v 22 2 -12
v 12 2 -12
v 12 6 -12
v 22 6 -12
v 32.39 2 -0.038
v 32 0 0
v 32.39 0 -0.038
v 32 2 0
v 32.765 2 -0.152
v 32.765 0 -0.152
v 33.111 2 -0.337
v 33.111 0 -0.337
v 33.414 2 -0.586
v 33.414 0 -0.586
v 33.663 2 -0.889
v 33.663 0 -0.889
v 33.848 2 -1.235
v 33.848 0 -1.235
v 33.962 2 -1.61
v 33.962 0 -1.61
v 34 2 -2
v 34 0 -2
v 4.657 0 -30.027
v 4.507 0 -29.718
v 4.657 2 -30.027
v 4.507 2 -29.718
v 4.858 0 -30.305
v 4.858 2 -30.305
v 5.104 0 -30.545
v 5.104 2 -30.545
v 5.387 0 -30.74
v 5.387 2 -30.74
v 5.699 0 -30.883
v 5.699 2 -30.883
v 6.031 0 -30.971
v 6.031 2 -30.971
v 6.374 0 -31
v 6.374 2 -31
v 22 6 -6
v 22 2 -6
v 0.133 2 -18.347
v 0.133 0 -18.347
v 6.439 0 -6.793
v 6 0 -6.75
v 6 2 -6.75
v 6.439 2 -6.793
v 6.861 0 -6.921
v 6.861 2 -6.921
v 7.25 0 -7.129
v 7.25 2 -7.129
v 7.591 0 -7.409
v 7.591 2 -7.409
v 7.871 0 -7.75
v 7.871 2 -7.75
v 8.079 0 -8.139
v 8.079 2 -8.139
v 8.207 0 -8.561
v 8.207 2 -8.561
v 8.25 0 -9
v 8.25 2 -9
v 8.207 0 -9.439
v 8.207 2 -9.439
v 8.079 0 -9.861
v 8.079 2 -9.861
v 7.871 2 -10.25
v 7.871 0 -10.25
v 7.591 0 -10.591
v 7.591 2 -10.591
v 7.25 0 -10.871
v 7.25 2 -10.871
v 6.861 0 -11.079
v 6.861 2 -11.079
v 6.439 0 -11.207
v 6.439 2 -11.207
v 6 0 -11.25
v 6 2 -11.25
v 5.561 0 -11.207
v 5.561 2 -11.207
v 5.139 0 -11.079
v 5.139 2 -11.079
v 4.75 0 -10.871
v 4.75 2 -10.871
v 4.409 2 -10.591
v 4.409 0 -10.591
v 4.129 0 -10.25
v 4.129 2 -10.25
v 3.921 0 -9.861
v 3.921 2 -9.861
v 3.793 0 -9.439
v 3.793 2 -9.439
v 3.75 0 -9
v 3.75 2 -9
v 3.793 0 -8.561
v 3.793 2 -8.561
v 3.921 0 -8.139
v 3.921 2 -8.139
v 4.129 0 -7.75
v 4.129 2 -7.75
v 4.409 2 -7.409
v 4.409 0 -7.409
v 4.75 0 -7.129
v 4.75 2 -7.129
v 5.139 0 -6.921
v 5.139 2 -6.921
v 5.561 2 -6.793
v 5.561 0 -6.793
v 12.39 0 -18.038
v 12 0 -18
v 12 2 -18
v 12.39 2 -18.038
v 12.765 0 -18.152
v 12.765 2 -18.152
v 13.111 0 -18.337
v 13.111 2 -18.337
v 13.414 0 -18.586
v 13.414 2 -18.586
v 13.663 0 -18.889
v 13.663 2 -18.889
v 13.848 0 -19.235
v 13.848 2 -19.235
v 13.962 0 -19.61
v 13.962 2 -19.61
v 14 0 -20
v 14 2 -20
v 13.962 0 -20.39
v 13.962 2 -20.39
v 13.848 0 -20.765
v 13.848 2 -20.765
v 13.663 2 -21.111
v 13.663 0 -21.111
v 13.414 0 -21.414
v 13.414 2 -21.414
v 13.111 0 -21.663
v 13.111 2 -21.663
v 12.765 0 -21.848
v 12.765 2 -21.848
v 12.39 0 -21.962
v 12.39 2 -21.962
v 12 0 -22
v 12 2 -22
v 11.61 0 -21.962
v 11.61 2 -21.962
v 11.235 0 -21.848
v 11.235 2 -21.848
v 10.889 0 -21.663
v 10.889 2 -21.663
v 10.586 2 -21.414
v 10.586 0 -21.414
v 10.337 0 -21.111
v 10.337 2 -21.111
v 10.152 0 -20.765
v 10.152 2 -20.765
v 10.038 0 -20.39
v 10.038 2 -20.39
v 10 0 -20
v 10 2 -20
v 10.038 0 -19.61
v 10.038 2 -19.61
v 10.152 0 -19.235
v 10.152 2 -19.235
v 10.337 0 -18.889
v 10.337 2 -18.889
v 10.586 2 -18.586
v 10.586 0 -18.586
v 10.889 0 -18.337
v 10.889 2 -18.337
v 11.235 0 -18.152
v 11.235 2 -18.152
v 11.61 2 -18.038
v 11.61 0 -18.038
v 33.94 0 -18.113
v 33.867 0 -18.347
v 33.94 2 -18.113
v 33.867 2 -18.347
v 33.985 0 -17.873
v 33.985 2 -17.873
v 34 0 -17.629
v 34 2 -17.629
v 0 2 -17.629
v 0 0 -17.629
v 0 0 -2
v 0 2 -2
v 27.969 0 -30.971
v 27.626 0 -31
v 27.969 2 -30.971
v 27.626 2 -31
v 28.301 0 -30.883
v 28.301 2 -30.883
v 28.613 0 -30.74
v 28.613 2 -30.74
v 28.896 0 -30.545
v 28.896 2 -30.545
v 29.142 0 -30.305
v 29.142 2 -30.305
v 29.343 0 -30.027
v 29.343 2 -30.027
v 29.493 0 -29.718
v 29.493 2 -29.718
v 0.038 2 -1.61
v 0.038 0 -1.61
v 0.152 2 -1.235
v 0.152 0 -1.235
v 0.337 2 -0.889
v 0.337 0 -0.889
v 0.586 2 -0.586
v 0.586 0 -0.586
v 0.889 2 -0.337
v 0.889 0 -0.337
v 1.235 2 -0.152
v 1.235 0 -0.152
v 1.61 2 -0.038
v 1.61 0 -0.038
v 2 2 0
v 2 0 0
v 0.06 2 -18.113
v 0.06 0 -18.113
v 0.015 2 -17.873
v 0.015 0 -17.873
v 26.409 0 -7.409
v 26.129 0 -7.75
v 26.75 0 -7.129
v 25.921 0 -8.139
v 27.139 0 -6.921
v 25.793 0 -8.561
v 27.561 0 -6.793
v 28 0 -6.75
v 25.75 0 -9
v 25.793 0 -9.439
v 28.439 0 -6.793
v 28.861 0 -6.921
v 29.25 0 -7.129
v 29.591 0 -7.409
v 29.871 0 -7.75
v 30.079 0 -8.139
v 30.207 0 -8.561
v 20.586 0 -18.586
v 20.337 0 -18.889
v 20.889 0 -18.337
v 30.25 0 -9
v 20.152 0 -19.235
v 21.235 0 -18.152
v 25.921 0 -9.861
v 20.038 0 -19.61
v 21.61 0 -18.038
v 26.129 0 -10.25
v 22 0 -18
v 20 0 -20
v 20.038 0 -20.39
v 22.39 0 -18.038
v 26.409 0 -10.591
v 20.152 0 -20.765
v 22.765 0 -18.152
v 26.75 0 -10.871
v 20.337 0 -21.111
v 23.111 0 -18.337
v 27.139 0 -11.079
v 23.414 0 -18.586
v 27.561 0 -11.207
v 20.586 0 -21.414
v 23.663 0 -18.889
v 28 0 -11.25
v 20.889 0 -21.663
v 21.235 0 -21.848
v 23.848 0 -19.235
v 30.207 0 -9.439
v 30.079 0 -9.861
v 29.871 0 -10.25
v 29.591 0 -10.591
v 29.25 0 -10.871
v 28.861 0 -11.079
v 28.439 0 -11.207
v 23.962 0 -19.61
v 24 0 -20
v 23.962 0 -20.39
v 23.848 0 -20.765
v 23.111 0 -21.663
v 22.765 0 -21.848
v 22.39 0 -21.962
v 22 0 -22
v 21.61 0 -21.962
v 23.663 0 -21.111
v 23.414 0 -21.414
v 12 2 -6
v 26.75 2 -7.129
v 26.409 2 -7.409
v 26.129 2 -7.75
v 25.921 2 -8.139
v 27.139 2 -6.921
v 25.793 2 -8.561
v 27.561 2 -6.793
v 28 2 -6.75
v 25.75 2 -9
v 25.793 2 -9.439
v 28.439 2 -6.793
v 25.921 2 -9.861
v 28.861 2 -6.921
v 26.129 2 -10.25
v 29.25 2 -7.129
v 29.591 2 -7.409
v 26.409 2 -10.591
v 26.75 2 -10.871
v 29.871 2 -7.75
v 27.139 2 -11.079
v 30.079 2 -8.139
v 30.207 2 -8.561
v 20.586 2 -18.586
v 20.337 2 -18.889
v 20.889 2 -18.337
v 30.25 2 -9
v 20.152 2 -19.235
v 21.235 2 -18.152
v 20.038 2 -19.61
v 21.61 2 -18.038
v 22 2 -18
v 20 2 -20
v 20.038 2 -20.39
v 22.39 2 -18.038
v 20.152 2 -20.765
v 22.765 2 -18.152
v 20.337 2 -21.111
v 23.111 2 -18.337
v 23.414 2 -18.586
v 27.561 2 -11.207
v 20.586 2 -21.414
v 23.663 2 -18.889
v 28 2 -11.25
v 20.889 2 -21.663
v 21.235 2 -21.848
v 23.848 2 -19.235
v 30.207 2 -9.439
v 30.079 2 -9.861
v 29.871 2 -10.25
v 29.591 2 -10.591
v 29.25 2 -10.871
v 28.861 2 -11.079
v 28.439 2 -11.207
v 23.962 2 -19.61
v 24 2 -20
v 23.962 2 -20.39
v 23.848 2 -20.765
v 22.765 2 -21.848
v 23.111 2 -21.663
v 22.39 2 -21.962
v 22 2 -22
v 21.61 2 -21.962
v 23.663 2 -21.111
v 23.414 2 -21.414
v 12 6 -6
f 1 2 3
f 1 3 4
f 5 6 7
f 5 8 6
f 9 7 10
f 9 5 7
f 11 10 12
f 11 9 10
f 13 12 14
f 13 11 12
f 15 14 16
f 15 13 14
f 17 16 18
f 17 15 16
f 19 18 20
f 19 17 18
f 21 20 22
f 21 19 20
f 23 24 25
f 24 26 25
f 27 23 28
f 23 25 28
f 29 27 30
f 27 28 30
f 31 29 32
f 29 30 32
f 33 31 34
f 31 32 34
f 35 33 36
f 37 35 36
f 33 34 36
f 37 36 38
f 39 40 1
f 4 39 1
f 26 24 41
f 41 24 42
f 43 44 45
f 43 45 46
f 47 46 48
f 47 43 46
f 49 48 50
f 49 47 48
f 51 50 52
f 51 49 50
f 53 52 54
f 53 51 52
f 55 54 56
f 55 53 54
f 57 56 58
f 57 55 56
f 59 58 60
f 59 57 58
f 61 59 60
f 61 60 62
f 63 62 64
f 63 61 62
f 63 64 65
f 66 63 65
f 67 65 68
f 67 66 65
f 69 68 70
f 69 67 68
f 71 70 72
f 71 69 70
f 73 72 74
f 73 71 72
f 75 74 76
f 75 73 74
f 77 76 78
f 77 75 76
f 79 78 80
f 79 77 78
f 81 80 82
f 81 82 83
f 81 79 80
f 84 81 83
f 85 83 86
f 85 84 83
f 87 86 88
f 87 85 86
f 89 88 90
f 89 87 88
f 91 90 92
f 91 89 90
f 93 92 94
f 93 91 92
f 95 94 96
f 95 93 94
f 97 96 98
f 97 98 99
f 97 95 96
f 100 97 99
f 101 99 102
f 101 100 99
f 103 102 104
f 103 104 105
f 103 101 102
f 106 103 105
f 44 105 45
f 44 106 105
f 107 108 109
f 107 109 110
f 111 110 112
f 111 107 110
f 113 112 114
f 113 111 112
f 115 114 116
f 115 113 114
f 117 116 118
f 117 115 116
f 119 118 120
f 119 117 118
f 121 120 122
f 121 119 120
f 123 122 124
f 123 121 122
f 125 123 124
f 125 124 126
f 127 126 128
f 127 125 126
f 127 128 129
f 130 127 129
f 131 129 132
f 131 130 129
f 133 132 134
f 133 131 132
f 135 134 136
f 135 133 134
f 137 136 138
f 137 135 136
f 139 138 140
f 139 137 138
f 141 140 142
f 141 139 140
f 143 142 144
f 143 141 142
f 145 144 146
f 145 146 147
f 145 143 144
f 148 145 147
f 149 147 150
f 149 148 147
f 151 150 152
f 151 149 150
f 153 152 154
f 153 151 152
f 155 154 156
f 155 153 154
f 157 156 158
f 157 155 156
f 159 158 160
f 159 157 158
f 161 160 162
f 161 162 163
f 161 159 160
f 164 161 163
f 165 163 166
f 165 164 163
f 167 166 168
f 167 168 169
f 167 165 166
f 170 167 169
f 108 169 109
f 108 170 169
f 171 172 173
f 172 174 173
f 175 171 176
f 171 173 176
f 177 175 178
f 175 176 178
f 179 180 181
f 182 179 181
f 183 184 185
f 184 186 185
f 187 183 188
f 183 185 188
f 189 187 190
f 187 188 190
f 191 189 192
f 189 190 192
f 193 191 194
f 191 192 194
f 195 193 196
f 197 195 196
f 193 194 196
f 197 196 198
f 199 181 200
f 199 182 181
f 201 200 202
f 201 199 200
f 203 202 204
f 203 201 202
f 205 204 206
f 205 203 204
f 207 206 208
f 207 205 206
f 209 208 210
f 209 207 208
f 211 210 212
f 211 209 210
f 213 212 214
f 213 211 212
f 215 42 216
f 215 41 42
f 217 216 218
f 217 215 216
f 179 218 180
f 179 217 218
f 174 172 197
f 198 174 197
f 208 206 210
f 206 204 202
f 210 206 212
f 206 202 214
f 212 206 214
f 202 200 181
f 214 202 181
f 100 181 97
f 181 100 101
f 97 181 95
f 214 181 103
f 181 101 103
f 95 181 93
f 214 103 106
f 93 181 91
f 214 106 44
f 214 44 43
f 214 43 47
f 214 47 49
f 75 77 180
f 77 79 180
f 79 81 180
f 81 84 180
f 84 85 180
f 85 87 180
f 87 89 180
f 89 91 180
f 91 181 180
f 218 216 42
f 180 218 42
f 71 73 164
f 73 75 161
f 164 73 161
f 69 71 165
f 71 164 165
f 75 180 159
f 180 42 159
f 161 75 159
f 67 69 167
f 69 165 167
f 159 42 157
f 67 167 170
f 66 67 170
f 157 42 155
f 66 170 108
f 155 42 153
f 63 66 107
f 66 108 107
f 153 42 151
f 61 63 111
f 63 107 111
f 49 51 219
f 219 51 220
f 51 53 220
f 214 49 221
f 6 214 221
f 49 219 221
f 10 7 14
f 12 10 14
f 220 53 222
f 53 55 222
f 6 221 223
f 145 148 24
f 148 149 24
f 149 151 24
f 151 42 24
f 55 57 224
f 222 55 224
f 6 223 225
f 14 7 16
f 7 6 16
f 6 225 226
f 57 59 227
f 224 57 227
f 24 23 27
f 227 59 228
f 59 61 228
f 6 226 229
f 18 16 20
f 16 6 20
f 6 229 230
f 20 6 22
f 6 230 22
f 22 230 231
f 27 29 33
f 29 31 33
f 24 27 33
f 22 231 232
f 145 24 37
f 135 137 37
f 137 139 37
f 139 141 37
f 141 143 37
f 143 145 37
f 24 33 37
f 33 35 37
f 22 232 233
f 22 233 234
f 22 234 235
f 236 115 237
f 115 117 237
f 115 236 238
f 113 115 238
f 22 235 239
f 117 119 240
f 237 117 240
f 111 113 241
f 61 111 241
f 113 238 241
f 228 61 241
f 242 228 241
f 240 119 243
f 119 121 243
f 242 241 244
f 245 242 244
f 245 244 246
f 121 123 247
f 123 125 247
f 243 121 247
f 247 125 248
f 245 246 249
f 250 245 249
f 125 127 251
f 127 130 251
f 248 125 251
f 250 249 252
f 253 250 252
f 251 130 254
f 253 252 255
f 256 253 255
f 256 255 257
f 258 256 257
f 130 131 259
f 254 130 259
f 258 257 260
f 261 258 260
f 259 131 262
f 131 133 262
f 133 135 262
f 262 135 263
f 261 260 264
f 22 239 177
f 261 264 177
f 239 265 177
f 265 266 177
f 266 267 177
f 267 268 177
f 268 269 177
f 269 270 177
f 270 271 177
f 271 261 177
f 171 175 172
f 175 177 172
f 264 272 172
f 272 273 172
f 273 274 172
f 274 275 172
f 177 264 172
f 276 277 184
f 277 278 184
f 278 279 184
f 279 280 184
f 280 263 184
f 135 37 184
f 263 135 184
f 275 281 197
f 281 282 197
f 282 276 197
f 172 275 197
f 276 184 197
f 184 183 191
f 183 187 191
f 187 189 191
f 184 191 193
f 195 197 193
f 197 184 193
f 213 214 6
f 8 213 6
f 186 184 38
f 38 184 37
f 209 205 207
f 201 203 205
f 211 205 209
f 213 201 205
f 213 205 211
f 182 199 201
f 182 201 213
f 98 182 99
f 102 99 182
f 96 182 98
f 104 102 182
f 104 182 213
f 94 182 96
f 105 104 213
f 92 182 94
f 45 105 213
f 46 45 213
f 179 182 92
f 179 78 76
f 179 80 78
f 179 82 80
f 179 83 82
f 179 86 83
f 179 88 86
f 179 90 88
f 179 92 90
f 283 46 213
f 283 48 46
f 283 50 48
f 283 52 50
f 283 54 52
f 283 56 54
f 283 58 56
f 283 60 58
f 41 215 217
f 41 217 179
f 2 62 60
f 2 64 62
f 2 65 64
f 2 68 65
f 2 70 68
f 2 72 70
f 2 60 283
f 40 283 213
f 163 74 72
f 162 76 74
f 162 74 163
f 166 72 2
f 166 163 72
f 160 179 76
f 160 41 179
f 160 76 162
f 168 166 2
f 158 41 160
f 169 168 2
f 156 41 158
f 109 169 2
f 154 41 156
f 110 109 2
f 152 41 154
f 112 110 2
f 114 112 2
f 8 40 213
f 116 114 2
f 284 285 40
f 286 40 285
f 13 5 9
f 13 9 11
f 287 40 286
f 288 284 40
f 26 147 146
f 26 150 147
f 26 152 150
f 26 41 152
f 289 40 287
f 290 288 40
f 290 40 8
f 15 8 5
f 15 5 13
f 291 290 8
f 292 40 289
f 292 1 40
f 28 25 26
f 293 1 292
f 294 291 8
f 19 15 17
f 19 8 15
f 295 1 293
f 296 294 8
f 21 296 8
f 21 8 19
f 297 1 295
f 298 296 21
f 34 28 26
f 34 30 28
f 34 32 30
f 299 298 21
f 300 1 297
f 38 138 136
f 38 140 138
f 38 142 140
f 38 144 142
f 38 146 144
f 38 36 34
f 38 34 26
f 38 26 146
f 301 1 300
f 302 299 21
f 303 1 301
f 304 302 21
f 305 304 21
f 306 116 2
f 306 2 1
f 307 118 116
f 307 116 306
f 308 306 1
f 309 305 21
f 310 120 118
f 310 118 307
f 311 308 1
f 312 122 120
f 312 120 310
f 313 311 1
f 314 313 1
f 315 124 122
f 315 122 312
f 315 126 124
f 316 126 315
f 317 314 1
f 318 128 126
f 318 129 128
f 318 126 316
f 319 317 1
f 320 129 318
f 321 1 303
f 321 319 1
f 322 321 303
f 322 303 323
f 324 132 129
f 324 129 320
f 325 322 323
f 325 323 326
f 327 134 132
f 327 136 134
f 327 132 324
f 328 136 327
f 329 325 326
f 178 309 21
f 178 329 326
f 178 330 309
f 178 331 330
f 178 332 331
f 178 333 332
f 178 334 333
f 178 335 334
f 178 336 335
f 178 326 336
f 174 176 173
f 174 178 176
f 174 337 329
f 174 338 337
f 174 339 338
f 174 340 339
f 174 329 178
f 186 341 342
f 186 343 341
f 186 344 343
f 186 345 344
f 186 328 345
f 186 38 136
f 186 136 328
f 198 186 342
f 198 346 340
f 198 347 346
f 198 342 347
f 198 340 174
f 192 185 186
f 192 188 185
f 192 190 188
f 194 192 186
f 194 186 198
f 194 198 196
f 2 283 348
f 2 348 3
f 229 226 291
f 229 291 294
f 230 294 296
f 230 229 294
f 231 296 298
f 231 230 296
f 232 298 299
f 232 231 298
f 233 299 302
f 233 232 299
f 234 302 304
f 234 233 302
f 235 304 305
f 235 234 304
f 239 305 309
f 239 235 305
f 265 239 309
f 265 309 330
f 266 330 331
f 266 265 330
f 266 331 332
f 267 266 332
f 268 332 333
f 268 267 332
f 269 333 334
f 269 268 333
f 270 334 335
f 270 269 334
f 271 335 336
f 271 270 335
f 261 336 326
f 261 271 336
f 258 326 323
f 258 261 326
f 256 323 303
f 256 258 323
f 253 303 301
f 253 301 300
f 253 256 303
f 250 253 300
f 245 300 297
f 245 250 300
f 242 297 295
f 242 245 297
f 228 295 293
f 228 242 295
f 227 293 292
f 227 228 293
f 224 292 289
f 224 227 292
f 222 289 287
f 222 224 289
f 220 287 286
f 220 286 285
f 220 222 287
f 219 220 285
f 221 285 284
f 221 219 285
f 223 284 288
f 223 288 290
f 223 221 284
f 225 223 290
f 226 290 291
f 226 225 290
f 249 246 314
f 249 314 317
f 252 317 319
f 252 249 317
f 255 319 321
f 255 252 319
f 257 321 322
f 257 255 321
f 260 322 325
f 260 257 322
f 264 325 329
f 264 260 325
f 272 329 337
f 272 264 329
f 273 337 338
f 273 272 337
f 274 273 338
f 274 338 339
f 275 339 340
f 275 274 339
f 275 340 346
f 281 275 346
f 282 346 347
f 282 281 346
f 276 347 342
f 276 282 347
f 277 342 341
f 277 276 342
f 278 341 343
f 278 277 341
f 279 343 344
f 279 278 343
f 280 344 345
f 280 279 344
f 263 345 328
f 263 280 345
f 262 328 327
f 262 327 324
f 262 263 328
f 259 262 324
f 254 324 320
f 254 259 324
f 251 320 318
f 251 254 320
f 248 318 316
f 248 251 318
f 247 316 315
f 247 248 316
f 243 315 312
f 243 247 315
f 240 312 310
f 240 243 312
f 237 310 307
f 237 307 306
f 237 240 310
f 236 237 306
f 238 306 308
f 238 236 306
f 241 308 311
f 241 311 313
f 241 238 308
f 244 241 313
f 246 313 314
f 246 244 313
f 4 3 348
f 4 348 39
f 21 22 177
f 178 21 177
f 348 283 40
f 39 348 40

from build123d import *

# Parameters (mm, degrees)
SKETCH_1_R      = 2.25
SKETCH_1_R_2    = 2
EXTRUDE_1_DEPTH = 2
SKETCH_2_W      = 10
SKETCH_2_H      = 6
EXTRUDE_2_DEPTH = 4
FILLET_1_R      = 2


with BuildPart() as part:
    # Эскиз1 → Бобышка-Вытянуть1 (new body)
    with BuildSketch(Plane(origin=(0, 0, 0), x_dir=(1, 0, 0), z_dir=(0, 1, 0))):
        Polygon((5, 31), (0, 18), (0, 0), (34, 0), (34, 18), (29, 31), align=None)
        with Locations(Location((6, 9, 0), (0, 0, 270))):
            Circle(SKETCH_1_R, mode=Mode.SUBTRACT)
        with Locations(Location((28, 9, 0), (0, 0, 270))):
            Circle(SKETCH_1_R, mode=Mode.SUBTRACT)
        with Locations(Location((12, 20, 0), (0, 0, 270))):
            Circle(SKETCH_1_R_2, mode=Mode.SUBTRACT)
        with Locations(Location((22, 20, 0), (0, 0, 270))):
            Circle(SKETCH_1_R_2, mode=Mode.SUBTRACT)
    extrude(amount=EXTRUDE_1_DEPTH)

    # Эскиз2 → Бобышка-Вытянуть2 (add)
    with BuildSketch(Plane(origin=(0, 2, 0), x_dir=(1, 0, 0), z_dir=(0, 1, 0))):
        with Locations((17, 9)):
            Rectangle(SKETCH_2_W, SKETCH_2_H)
    extrude(amount=EXTRUDE_2_DEPTH)

    # Скругление1
    fillet_1_edges = [part.edges().sort_by_distance(p)[0] for p in [
        (34, 1, -18),
        (34, 1, 0),
        (0, 1, 0),
        (0, 1, -18),
        (5, 1, -31),
        (29, 1, -31),
    ]]
    fillet(fillet_1_edges, radius=FILLET_1_R)


solid = part.part
